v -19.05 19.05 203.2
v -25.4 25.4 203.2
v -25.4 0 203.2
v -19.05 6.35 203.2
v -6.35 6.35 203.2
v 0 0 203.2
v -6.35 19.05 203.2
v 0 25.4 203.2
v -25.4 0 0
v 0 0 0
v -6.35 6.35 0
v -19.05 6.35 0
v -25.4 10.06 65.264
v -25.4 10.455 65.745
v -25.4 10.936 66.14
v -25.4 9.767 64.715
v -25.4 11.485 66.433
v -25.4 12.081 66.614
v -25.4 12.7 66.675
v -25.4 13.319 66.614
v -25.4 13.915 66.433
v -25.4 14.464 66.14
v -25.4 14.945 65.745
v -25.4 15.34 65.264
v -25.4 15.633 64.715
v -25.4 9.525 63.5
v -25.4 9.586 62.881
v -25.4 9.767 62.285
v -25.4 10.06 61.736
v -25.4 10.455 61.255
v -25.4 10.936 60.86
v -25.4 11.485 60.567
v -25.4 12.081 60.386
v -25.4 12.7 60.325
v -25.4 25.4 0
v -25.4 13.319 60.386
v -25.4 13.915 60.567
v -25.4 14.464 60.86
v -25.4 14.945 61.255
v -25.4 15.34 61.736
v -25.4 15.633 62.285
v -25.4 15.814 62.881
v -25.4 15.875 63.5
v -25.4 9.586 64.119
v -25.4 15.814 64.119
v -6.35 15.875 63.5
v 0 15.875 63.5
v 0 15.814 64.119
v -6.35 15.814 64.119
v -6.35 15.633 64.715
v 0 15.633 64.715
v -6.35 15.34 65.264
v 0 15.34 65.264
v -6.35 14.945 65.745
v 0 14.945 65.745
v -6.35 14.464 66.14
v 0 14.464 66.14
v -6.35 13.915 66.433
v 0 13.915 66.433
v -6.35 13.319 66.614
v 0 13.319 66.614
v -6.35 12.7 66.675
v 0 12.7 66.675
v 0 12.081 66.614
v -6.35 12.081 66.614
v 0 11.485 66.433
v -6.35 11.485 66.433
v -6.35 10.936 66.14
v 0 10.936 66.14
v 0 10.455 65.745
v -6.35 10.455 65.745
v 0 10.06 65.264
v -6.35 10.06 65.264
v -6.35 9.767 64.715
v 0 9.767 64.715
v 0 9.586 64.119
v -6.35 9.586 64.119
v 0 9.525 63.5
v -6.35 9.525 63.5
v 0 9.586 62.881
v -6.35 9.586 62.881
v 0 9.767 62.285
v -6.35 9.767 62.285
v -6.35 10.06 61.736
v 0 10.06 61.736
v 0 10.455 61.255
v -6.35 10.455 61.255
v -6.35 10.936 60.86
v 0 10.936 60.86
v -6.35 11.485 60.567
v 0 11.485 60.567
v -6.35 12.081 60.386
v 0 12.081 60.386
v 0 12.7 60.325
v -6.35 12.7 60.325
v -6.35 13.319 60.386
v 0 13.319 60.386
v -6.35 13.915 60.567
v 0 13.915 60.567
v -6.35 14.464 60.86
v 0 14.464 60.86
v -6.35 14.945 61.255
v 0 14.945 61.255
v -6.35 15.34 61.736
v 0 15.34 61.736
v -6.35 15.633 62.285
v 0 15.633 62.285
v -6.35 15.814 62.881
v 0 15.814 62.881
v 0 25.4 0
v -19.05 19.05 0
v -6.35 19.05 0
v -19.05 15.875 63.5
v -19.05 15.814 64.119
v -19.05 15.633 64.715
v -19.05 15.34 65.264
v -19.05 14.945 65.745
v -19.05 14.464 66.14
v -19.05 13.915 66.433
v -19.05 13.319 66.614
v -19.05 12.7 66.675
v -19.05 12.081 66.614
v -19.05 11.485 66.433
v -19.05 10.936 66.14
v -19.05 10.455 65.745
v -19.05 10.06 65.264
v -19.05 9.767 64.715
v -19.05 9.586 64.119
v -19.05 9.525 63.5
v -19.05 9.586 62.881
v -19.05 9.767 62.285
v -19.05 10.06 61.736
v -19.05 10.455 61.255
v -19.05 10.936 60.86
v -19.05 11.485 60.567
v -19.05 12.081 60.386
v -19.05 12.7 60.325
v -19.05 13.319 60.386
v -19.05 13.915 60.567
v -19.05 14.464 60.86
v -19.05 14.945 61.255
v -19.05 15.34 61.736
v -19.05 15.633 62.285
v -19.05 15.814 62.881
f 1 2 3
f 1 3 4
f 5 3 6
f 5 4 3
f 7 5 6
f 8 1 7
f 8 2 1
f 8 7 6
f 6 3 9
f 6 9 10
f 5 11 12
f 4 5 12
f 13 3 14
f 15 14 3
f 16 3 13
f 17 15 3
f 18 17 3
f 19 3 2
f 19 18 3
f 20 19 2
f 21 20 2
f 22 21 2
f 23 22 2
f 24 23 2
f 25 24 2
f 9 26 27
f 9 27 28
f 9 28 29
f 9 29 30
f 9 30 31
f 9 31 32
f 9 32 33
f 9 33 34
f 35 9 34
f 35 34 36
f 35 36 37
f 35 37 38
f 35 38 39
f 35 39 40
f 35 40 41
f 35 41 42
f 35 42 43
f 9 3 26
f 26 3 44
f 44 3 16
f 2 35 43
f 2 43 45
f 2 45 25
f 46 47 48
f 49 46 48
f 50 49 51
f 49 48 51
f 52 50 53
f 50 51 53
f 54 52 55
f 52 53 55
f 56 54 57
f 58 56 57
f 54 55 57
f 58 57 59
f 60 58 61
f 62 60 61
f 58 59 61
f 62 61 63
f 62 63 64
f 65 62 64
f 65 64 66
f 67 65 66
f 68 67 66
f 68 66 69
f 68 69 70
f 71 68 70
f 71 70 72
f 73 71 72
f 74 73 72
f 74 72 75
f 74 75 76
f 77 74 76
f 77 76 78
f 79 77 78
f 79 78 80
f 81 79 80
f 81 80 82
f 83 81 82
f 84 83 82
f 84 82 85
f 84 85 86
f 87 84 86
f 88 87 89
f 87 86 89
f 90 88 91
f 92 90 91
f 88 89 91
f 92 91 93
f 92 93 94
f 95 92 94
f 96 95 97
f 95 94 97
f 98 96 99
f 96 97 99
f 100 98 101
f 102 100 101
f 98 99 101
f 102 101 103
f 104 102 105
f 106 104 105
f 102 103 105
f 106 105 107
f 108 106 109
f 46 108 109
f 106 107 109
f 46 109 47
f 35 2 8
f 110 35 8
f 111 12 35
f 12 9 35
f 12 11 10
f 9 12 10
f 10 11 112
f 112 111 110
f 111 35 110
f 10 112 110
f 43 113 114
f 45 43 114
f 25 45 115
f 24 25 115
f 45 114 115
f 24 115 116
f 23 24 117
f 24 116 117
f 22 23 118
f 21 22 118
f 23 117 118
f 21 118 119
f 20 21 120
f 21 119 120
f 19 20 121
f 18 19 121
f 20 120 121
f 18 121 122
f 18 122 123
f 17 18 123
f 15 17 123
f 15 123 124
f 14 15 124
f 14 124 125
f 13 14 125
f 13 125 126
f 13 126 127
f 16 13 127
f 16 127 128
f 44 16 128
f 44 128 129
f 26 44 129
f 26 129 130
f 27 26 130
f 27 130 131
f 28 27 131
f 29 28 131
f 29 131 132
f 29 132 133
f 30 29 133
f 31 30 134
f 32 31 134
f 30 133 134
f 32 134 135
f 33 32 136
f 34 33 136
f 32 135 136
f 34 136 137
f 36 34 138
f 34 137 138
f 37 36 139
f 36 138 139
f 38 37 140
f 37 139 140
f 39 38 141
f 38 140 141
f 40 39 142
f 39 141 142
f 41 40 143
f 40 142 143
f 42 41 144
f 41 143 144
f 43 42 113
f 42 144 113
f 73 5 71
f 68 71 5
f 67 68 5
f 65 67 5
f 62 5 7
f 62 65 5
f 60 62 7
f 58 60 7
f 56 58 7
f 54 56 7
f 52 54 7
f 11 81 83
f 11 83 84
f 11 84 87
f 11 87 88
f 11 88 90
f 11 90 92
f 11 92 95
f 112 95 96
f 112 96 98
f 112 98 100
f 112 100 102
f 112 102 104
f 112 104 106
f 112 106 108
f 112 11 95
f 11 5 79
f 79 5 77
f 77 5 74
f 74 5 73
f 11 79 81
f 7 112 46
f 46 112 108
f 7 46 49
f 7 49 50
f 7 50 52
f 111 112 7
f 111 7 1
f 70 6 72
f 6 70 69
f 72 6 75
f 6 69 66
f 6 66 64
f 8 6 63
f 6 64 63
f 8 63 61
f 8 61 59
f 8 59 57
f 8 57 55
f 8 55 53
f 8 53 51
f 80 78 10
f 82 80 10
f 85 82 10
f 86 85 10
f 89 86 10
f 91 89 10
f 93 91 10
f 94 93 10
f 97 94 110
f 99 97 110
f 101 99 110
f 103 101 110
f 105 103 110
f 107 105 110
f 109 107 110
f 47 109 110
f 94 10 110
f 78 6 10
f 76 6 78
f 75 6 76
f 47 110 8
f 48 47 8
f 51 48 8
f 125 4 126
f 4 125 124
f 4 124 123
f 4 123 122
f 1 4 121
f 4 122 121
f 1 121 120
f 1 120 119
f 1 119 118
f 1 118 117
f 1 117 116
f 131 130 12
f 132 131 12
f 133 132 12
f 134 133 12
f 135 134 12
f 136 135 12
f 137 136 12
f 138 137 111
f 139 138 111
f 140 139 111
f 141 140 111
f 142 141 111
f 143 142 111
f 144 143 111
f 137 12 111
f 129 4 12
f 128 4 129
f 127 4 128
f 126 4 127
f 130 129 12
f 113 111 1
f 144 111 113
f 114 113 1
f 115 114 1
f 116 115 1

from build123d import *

# Parameters (mm, degrees)
SKETCH1_W           = 25.4
SKETCH1_H           = 25.4
BOSS_EXTRUDE1_DEPTH = 203.2
SKETCH2_R           = 3.175
CUT_EXTRUDE1_DEPTH  = 207.350575478
SKETCH3_W           = 12.7
SKETCH3_H           = 12.7
CUT_EXTRUDE2_DEPTH  = 207.350575478


with BuildPart() as part:
    # Sketch1 → Boss-Extrude1 (new body)
    with BuildSketch(Plane.XY):
        with Locations((-12.7, 12.7)):
            Rectangle(SKETCH1_W, SKETCH1_H)
    extrude(amount=BOSS_EXTRUDE1_DEPTH)

    # Sketch2 → Cut-Extrude1 (cut, through all)
    with BuildSketch(Plane(origin=(0, 0, 0), x_dir=(0, 0, -1), z_dir=(1, 0, 0))):
        with Locations(Location((-63.5, 12.7, 0), (0, 0, 90))):
            Circle(SKETCH2_R)
    extrude(amount=-CUT_EXTRUDE1_DEPTH, mode=Mode.SUBTRACT)

    # Sketch3 → Cut-Extrude2 (cut, through all)
    with BuildSketch(Plane(origin=(0, 0, 0), x_dir=(-1, 0, 0), z_dir=(0, 0, -1))):
        with Locations((12.7, 12.7)):
            Rectangle(SKETCH3_W, SKETCH3_H)
    extrude(amount=-CUT_EXTRUDE2_DEPTH, mode=Mode.SUBTRACT)


solid = part.part
